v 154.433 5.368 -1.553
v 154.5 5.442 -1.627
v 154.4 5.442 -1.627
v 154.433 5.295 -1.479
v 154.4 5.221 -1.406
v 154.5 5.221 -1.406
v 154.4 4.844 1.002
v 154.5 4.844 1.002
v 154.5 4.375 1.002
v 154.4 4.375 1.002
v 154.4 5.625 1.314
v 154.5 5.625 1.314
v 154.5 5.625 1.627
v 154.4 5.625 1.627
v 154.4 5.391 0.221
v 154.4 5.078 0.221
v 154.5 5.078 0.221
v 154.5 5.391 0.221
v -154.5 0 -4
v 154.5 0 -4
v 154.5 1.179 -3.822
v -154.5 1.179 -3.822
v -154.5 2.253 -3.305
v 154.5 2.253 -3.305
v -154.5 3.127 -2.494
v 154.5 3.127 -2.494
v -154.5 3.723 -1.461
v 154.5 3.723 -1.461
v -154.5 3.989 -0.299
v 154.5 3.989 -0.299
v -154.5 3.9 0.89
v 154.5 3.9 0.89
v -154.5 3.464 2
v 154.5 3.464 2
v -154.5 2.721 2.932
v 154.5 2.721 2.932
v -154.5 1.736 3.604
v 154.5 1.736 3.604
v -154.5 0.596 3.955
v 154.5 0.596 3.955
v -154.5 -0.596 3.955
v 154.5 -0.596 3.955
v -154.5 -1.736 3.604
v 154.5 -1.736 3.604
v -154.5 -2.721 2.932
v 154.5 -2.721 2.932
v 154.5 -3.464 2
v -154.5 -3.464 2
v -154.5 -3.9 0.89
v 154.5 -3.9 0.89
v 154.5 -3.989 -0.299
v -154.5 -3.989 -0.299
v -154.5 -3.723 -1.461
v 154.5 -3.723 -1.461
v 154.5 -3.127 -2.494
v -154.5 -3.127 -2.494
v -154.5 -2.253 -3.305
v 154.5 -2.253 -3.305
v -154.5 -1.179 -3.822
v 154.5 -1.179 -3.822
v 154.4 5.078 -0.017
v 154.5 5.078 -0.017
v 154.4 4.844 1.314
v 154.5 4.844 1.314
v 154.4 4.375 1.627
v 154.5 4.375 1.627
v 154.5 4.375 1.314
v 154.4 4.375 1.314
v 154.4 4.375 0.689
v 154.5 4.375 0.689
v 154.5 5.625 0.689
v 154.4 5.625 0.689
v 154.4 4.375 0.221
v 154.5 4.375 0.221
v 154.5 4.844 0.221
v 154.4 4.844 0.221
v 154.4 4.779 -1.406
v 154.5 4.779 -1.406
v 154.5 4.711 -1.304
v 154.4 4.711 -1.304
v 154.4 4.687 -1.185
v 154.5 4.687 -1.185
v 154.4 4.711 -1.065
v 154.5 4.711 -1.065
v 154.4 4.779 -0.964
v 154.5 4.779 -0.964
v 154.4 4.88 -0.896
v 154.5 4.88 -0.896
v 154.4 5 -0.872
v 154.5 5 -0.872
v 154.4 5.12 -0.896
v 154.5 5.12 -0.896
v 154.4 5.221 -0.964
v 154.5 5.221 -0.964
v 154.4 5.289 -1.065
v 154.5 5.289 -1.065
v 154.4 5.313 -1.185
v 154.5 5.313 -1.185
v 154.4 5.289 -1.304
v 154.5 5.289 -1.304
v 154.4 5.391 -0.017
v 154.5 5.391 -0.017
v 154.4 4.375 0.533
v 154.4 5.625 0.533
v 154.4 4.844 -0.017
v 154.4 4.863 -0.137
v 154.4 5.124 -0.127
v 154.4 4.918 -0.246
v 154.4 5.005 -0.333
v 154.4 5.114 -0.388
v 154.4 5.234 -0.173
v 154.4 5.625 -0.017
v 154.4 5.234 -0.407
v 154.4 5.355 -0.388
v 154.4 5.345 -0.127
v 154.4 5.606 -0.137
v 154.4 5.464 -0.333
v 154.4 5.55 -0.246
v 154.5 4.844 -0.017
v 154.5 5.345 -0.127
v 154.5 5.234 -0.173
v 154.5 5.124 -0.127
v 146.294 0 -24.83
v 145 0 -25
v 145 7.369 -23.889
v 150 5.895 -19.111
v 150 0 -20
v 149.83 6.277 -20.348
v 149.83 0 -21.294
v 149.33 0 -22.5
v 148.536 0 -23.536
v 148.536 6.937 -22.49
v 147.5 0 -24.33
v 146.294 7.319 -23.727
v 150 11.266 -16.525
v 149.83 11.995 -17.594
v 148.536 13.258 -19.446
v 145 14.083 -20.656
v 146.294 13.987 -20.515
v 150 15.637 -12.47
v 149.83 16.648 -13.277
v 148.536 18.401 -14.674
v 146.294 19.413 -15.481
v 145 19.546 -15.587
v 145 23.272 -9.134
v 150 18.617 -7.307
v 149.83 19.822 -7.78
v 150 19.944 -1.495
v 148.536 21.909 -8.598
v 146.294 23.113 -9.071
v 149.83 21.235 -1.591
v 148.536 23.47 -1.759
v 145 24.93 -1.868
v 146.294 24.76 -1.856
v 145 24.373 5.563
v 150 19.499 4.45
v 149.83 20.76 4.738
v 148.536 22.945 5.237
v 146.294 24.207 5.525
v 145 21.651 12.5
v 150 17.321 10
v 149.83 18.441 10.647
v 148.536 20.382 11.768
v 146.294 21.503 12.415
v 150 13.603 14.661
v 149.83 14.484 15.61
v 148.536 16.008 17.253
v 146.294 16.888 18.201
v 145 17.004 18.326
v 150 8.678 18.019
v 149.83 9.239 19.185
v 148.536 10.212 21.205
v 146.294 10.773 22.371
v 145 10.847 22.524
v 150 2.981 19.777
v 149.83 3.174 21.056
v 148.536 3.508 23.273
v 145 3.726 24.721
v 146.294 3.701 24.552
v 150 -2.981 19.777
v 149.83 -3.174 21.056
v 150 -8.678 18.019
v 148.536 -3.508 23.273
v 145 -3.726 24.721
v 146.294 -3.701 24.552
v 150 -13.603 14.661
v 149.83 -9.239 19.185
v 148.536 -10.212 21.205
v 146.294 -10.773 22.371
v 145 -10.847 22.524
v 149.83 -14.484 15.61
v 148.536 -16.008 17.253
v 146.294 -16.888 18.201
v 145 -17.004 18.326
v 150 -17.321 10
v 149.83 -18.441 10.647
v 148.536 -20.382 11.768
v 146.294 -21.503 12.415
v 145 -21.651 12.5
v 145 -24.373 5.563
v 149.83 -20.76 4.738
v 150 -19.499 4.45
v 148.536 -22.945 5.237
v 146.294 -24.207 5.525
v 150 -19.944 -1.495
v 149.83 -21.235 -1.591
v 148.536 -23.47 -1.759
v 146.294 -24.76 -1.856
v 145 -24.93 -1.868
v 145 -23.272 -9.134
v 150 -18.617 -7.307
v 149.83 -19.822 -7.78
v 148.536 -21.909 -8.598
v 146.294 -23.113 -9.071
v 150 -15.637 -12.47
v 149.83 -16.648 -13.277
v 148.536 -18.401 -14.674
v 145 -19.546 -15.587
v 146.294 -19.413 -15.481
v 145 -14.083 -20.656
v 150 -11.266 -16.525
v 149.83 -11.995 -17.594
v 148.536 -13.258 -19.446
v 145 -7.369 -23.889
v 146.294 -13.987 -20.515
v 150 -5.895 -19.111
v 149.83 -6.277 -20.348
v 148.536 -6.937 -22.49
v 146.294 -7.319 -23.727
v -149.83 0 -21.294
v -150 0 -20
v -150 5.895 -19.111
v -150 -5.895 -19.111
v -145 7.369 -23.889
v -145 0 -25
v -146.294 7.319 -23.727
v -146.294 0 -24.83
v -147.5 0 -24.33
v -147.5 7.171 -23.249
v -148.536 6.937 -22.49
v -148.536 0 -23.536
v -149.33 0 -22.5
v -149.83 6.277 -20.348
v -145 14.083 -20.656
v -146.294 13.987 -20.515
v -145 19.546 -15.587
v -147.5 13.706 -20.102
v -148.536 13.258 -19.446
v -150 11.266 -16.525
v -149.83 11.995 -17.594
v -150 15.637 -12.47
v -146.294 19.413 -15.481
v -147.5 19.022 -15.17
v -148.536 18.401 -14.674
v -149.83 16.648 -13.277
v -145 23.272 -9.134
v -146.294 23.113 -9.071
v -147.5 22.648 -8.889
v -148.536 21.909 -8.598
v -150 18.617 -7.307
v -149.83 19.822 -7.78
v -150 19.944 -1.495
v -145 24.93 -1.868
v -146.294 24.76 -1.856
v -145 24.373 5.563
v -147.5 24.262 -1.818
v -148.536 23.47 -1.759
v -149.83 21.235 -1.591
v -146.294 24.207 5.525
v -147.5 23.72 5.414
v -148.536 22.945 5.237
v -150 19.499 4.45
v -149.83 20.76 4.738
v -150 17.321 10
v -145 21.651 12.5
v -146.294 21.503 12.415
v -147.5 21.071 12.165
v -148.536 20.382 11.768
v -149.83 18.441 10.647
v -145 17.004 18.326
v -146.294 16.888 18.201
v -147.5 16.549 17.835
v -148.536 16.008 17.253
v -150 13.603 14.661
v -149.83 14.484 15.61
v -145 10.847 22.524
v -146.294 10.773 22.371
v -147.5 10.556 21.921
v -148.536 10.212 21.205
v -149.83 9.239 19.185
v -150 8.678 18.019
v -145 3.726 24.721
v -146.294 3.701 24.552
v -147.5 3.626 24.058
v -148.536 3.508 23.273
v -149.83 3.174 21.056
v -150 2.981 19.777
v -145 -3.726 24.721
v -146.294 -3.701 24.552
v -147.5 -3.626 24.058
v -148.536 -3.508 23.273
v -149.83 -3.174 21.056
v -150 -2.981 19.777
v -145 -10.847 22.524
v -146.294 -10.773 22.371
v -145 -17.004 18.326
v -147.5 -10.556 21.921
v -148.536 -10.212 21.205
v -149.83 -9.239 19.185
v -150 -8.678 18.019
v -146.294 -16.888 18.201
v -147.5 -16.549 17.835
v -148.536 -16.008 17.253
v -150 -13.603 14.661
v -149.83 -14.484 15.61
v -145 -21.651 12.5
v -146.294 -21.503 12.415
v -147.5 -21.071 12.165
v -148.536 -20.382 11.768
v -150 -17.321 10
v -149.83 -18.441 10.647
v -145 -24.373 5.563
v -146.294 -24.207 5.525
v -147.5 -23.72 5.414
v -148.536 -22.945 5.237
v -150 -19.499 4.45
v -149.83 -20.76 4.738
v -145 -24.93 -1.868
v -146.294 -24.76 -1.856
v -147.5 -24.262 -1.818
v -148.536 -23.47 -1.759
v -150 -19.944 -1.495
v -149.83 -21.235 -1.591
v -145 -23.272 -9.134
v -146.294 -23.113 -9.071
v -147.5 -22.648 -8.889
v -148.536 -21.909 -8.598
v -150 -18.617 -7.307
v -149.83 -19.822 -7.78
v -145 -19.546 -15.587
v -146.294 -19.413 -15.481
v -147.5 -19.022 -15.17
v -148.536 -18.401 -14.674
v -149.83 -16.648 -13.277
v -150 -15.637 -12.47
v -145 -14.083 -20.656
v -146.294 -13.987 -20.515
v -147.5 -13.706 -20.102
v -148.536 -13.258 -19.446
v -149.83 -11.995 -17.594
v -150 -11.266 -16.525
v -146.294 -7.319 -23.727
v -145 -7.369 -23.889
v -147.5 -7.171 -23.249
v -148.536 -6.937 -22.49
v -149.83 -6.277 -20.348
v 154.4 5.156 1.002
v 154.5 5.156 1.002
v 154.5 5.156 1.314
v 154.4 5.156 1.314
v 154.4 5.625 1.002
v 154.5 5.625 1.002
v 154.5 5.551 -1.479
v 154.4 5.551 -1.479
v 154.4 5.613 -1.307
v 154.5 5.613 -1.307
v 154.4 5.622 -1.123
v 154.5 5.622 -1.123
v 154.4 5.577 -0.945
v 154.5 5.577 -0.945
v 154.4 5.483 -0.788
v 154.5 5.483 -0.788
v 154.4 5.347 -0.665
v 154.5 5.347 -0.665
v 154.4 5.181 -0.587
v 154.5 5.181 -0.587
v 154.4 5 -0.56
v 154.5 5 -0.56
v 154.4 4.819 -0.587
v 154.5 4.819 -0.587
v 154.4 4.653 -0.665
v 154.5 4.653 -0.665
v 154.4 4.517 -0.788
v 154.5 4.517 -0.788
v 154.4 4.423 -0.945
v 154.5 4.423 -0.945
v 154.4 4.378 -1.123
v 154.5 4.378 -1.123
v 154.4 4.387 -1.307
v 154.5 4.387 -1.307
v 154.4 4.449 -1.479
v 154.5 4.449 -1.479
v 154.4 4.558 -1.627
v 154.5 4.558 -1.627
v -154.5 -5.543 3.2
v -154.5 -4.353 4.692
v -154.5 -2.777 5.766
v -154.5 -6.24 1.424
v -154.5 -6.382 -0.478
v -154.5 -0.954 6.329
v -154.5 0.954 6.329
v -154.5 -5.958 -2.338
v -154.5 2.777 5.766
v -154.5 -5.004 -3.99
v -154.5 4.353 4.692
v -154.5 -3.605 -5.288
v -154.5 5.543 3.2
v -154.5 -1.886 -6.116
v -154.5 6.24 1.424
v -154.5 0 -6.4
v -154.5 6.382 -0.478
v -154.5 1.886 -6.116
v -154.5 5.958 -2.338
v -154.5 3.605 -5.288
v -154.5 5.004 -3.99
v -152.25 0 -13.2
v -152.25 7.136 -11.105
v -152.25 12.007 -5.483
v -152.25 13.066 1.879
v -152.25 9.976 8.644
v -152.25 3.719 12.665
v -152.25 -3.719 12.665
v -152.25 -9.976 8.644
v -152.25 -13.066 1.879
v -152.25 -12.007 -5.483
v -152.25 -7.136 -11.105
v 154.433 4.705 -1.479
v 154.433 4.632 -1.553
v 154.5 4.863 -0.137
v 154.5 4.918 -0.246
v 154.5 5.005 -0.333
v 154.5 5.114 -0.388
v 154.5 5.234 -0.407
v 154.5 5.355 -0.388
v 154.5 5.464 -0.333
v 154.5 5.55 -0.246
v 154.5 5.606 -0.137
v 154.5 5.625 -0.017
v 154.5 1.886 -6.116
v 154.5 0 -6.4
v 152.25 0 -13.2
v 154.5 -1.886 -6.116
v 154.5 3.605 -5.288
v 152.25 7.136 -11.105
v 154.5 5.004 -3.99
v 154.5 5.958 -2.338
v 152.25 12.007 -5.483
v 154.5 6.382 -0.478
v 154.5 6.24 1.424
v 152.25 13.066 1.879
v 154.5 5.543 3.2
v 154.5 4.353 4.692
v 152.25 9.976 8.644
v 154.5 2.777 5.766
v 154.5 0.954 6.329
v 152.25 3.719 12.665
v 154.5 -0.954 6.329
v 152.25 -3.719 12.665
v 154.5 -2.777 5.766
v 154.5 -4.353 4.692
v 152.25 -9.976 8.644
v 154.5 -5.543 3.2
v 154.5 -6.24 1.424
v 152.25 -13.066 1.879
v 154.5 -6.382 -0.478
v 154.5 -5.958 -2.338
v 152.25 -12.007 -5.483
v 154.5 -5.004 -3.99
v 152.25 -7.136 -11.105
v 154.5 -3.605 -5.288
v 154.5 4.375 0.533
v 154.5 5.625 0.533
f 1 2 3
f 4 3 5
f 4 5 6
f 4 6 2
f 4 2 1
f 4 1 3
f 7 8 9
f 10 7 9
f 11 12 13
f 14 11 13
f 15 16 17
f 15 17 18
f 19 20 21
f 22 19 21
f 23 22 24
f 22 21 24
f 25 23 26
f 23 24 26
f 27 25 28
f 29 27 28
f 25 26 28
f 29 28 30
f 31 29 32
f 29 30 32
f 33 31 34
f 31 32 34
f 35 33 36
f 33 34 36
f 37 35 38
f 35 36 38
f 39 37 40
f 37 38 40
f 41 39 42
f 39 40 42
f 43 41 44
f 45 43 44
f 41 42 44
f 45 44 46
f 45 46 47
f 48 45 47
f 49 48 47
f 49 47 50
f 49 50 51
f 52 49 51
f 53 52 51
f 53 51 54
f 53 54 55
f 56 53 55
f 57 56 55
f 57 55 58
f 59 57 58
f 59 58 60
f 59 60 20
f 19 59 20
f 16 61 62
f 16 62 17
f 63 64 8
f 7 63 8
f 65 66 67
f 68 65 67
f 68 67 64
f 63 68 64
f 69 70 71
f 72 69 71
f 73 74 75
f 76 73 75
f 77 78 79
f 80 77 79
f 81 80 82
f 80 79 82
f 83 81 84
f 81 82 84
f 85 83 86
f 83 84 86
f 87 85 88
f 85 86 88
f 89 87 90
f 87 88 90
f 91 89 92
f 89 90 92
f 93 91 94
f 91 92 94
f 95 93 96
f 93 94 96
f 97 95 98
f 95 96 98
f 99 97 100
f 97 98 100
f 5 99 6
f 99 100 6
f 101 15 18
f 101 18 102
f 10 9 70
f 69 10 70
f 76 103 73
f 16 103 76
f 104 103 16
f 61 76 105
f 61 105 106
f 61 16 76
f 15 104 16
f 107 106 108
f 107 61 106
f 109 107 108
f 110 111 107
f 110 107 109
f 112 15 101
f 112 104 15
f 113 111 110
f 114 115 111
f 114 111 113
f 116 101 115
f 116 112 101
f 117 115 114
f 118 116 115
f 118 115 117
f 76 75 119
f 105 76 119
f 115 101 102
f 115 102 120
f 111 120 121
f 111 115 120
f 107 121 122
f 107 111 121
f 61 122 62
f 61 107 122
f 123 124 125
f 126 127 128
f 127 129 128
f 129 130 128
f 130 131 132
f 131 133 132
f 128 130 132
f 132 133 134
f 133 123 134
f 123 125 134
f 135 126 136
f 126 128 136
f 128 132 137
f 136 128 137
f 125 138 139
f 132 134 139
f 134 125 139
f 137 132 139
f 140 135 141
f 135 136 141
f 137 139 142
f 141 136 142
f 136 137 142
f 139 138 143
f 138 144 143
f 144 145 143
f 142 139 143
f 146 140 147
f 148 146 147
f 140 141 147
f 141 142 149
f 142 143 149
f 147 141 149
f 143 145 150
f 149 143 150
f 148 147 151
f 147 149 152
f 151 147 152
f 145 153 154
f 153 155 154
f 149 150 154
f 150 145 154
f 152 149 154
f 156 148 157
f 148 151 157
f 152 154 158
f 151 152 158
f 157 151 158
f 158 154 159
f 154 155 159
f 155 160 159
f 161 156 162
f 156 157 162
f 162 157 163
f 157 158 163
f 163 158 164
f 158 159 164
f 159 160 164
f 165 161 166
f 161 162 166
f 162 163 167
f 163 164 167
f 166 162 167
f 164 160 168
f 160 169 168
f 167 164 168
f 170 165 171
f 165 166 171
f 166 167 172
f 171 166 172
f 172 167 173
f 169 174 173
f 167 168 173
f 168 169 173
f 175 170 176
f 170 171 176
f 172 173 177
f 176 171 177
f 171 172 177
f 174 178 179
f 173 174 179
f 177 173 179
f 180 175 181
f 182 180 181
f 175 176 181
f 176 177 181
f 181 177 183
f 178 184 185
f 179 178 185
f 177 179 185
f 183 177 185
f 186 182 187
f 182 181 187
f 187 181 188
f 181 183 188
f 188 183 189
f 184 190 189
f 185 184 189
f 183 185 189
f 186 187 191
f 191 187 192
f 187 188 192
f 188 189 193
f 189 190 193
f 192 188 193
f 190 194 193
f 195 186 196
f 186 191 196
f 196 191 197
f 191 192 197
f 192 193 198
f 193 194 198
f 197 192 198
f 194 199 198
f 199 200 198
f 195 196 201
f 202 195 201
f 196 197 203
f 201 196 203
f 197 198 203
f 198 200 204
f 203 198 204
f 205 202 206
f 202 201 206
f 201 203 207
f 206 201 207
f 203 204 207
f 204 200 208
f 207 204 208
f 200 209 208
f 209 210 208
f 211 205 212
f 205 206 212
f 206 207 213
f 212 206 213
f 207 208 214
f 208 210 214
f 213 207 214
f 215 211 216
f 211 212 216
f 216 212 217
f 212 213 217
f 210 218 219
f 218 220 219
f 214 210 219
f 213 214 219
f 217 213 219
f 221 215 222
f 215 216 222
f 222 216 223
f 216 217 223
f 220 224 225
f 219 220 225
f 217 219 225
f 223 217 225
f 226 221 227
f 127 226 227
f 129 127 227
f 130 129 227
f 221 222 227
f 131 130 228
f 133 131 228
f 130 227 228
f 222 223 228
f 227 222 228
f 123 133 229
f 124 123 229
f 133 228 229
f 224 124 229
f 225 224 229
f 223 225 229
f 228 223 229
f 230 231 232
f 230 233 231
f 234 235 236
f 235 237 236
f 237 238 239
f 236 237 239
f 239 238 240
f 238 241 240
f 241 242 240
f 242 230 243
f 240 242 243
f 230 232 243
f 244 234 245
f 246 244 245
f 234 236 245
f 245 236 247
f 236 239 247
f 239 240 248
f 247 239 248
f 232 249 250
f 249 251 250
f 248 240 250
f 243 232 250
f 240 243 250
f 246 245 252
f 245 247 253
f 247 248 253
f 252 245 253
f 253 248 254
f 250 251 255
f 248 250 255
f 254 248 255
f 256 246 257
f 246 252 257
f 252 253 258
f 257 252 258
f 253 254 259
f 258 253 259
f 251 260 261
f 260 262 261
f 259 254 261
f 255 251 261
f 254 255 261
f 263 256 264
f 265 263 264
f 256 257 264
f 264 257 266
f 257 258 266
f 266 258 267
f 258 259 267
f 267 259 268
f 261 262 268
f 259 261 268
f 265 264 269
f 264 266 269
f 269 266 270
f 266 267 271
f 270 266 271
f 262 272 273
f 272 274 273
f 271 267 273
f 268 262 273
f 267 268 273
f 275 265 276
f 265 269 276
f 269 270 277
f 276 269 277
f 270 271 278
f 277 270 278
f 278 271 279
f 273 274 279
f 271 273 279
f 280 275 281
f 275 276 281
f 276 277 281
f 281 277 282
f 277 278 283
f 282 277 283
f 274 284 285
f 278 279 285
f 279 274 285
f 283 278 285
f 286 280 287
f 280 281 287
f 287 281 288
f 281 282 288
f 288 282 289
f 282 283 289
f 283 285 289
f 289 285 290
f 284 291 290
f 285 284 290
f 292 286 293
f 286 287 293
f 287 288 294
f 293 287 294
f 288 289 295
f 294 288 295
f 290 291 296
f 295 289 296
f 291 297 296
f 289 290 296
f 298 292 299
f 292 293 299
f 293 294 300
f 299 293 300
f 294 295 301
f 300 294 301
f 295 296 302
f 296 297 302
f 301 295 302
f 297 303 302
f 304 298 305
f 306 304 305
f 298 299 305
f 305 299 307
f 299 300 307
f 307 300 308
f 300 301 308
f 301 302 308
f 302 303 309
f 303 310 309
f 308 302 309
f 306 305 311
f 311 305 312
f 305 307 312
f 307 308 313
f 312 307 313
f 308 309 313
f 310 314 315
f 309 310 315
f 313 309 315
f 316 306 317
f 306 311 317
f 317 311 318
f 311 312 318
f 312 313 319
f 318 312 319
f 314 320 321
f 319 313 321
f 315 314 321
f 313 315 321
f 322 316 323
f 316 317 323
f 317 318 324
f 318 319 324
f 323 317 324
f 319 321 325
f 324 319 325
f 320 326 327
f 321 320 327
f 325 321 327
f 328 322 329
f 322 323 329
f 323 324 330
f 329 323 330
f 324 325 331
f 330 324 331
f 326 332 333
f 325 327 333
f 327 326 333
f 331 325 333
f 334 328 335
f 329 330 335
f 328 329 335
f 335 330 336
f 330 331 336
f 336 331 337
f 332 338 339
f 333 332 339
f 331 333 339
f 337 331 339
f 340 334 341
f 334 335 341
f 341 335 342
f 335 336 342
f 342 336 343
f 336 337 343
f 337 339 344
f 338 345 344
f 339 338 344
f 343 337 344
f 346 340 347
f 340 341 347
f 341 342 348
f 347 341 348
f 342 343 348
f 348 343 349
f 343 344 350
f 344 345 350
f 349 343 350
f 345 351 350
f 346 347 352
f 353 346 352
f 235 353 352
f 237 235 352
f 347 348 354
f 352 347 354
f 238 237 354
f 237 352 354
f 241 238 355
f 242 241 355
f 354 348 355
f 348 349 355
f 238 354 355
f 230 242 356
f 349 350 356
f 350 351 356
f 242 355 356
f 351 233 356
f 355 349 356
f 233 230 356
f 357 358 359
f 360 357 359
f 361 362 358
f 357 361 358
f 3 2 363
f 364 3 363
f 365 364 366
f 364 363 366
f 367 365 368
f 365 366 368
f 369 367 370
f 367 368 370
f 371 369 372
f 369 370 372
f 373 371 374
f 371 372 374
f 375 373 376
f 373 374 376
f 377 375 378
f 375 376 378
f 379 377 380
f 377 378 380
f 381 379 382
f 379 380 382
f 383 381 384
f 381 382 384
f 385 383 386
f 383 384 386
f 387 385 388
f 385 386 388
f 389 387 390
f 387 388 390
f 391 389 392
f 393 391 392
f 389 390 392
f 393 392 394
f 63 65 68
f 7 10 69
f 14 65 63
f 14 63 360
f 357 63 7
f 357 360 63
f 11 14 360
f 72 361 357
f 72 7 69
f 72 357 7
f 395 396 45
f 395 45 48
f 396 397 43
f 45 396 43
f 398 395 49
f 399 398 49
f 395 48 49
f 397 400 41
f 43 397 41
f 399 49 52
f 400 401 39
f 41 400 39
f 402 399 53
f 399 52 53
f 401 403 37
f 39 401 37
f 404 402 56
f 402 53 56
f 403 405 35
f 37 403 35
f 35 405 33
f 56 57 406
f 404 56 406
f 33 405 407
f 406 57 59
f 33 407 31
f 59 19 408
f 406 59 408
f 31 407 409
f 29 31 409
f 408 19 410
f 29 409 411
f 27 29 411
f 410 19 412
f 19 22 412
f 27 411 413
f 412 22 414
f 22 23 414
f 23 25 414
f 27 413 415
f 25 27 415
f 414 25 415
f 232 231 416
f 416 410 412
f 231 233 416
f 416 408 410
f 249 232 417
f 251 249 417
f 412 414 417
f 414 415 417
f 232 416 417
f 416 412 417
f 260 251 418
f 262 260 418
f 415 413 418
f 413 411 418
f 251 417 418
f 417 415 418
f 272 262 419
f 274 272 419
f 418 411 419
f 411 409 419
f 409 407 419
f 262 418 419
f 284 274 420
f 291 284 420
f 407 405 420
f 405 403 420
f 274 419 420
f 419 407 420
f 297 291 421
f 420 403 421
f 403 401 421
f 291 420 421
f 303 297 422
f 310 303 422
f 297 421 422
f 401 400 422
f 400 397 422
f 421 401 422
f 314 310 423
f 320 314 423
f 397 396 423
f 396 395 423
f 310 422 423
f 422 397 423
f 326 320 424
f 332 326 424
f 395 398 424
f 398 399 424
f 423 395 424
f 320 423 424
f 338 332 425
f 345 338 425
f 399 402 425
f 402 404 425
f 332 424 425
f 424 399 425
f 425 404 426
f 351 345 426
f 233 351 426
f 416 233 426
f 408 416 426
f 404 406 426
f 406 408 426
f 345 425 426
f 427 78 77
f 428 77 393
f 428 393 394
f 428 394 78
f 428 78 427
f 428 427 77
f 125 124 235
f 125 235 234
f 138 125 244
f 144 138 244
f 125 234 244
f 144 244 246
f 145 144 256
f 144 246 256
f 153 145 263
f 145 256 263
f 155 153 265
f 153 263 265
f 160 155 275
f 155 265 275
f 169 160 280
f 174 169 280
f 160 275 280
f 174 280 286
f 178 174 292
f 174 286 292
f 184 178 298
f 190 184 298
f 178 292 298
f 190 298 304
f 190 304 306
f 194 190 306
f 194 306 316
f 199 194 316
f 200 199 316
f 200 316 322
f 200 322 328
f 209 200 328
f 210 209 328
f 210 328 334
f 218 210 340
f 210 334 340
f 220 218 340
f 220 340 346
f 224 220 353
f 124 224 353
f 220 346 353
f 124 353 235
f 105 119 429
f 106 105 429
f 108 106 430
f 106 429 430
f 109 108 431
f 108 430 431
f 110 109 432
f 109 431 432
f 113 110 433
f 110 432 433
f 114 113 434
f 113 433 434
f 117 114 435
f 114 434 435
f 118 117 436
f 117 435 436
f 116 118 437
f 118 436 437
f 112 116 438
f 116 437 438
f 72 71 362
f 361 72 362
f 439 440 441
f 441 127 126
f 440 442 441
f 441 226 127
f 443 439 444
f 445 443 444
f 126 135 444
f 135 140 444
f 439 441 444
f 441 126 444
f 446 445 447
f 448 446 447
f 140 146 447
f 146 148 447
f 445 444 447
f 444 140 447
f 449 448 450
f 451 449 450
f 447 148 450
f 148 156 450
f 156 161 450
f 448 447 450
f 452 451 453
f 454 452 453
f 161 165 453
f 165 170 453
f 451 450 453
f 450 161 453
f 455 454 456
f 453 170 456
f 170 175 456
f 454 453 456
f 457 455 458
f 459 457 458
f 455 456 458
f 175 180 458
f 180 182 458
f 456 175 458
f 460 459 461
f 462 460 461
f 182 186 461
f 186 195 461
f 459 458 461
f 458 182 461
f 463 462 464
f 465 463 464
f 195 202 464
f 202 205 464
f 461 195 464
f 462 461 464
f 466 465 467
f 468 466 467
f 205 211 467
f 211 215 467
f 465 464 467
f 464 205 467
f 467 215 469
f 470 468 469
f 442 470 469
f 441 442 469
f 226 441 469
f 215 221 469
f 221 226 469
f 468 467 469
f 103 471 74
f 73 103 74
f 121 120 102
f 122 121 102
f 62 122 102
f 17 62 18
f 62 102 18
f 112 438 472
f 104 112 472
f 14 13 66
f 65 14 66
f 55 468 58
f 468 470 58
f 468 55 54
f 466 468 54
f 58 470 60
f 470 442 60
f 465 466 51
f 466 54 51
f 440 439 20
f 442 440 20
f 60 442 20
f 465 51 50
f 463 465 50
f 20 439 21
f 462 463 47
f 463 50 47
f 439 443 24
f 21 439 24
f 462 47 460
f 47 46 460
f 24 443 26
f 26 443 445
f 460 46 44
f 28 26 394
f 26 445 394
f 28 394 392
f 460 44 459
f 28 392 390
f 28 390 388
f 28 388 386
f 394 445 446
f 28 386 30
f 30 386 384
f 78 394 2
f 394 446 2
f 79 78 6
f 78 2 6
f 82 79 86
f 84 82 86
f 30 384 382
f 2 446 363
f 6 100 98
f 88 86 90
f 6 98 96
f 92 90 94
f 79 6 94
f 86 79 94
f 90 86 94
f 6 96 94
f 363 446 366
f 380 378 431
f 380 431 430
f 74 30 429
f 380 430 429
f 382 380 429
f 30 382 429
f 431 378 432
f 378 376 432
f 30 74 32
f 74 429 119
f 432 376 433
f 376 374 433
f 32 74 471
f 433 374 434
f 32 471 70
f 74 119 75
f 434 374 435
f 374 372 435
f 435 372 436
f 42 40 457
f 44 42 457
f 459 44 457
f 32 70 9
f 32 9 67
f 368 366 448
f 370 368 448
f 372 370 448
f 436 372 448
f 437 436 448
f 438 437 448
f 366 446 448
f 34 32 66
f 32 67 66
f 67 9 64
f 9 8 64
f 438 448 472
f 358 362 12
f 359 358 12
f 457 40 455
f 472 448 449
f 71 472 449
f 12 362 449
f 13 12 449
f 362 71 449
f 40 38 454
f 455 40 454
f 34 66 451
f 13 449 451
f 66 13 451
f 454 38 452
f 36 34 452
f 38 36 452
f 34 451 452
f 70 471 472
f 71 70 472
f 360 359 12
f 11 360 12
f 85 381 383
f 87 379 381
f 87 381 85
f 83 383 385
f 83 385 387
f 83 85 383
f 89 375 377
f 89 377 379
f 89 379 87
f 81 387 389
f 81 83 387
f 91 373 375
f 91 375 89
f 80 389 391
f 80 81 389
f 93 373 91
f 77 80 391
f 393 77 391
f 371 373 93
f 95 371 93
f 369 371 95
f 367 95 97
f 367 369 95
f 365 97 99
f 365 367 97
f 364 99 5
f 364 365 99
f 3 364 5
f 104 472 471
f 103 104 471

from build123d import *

# Parameters (mm, degrees)
ENL_V_MAT_EXTRU_1_DEPTH       = 0.1
BOSS_EXTRU_1_DEPTH            = 0.1
ENL_V_MAT_EXTRU_2_DEPTH       = 0.1
ENL_V_MAT_EXTRU_3_DEPTH       = 0.1
DIAM_TRE_DU_PER_AGE_8_0_8_1_D = 8


with BuildPart() as part:
    # Esquisse1 → Révolution1 (revolve)
    with BuildSketch(Plane.XY, mode=Mode.PRIVATE) as r_volution1_sk:
        with BuildLine():
            Line((-154.5, 6.4), (-154.5, 0))
            Line((-154.5, 0), (154.5, 0))
            Line((154.5, 0), (154.5, 6.4))
            Line((154.5, 6.4), (150, 20))
            ThreePointArc((150, 20), (148.535533906, 23.535533906), (145, 25))
            Line((145, 25), (-145, 25))
            ThreePointArc((-145, 25), (-148.535533906, 23.535533906), (-150, 20))
            Line((-150, 20), (-154.5, 6.4))
        make_face()
    revolve(r_volution1_sk.sketch.rotate(Axis((-154.5, 0, 0), (1, 0, 0)), 270), axis=Axis((-154.5, 0, 0), (1, 0, 0)))

    # Esquisse2 → Enlèv. mat.-Extru.1 (cut)
    with BuildSketch(Plane(origin=(154.5, 0, 0), x_dir=(0, 0, -1), z_dir=(1, 0, 0))):
        with BuildLine():
            Line((-0.220970869, 4.84375), (0.016600829, 4.84375))
            ThreePointArc((0.016600829, 4.84375), (0.407225829, 5.234375), (0.016600829, 5.625))
            Line((0.016600829, 5.625), (-0.533470869, 5.625))
            Line((-0.533470869, 5.625), (-0.533470869, 4.375))
            Line((-0.533470869, 4.375), (-0.220970869, 4.375))
            Line((-0.220970869, 4.375), (-0.220970869, 4.84375))
        make_face()
    extrude(amount=-ENL_V_MAT_EXTRU_1_DEPTH, mode=Mode.SUBTRACT)

    # Esquisse3 → Boss.-Extru.1 (add)
    with BuildSketch(Plane(origin=(154.4, 0, 0), x_dir=(0, 0, -1), z_dir=(1, 0, 0))):
        with BuildLine():
            Line((-0.220970869, 5.390625), (0.016600773, 5.390625))
            ThreePointArc((0.016600773, 5.390625), (0.172850773, 5.234375), (0.016600773, 5.078125))
            Line((0.016600773, 5.078125), (-0.220970869, 5.078125))
            Line((-0.220970869, 5.078125), (-0.220970869, 5.390625))
        make_face()
    extrude(amount=BOSS_EXTRU_1_DEPTH)

    # Esquisse4 → Enlèv. mat.-Extru.2 (cut)
    with BuildSketch(Plane(origin=(154.5, 0, 0), x_dir=(0, 0, -1), z_dir=(1, 0, 0))):
        Polygon((-1.001554062, 5.15625), (-1.314054062, 5.15625), (-1.314054062, 5.625), (-1.626554062, 5.625), (-1.626554062, 4.375), (-1.314054062, 4.375), (-1.314054062, 4.84375), (-1.001554062, 4.84375), (-1.001554062, 4.375), (-0.689054062, 4.375), (-0.689054062, 5.625), (-1.001554062, 5.625), align=None)
    extrude(amount=-ENL_V_MAT_EXTRU_2_DEPTH, mode=Mode.SUBTRACT)

    # Esquisse5 → Enlèv. mat.-Extru.3 (cut)
    with BuildSketch(Plane(origin=(154.5, 0, 0), x_dir=(0, 0, -1), z_dir=(1, 0, 0))):
        with BuildLine():
            ThreePointArc((1.626553937, 5.441941613), (0.5596125, 5), (1.626554062, 4.558058262))
            add(Edge.make_bspline(
                [(1.405583193, 4.779029131), (1.479240149, 4.705372175), (1.552897105, 4.631715218), (1.626554062, 4.558058262)],
                knots=[0, 0, 0, 0, 1, 1, 1, 1], degree=3))
            ThreePointArc((1.405583193, 4.779029131), (0.872112323, 5), (1.405583193, 5.220970869))
            add(Edge.make_bspline(
                [(1.626553937, 5.441941613), (1.552897022, 5.368284699), (1.479240107, 5.294627784), (1.405583193, 5.220970869)],
                knots=[0, 0, 0, 0, 1, 1, 1, 1], degree=3))
        make_face()
    extrude(amount=-ENL_V_MAT_EXTRU_3_DEPTH, mode=Mode.SUBTRACT)

    # Diamètre du perçage Ø8.0 (8)1 (through all)
    with Locations(Plane.ZY.offset(154.5)):
        with Locations((0, 0)):
            Hole(DIAM_TRE_DU_PER_AGE_8_0_8_1_D / 2)


solid = part.part
